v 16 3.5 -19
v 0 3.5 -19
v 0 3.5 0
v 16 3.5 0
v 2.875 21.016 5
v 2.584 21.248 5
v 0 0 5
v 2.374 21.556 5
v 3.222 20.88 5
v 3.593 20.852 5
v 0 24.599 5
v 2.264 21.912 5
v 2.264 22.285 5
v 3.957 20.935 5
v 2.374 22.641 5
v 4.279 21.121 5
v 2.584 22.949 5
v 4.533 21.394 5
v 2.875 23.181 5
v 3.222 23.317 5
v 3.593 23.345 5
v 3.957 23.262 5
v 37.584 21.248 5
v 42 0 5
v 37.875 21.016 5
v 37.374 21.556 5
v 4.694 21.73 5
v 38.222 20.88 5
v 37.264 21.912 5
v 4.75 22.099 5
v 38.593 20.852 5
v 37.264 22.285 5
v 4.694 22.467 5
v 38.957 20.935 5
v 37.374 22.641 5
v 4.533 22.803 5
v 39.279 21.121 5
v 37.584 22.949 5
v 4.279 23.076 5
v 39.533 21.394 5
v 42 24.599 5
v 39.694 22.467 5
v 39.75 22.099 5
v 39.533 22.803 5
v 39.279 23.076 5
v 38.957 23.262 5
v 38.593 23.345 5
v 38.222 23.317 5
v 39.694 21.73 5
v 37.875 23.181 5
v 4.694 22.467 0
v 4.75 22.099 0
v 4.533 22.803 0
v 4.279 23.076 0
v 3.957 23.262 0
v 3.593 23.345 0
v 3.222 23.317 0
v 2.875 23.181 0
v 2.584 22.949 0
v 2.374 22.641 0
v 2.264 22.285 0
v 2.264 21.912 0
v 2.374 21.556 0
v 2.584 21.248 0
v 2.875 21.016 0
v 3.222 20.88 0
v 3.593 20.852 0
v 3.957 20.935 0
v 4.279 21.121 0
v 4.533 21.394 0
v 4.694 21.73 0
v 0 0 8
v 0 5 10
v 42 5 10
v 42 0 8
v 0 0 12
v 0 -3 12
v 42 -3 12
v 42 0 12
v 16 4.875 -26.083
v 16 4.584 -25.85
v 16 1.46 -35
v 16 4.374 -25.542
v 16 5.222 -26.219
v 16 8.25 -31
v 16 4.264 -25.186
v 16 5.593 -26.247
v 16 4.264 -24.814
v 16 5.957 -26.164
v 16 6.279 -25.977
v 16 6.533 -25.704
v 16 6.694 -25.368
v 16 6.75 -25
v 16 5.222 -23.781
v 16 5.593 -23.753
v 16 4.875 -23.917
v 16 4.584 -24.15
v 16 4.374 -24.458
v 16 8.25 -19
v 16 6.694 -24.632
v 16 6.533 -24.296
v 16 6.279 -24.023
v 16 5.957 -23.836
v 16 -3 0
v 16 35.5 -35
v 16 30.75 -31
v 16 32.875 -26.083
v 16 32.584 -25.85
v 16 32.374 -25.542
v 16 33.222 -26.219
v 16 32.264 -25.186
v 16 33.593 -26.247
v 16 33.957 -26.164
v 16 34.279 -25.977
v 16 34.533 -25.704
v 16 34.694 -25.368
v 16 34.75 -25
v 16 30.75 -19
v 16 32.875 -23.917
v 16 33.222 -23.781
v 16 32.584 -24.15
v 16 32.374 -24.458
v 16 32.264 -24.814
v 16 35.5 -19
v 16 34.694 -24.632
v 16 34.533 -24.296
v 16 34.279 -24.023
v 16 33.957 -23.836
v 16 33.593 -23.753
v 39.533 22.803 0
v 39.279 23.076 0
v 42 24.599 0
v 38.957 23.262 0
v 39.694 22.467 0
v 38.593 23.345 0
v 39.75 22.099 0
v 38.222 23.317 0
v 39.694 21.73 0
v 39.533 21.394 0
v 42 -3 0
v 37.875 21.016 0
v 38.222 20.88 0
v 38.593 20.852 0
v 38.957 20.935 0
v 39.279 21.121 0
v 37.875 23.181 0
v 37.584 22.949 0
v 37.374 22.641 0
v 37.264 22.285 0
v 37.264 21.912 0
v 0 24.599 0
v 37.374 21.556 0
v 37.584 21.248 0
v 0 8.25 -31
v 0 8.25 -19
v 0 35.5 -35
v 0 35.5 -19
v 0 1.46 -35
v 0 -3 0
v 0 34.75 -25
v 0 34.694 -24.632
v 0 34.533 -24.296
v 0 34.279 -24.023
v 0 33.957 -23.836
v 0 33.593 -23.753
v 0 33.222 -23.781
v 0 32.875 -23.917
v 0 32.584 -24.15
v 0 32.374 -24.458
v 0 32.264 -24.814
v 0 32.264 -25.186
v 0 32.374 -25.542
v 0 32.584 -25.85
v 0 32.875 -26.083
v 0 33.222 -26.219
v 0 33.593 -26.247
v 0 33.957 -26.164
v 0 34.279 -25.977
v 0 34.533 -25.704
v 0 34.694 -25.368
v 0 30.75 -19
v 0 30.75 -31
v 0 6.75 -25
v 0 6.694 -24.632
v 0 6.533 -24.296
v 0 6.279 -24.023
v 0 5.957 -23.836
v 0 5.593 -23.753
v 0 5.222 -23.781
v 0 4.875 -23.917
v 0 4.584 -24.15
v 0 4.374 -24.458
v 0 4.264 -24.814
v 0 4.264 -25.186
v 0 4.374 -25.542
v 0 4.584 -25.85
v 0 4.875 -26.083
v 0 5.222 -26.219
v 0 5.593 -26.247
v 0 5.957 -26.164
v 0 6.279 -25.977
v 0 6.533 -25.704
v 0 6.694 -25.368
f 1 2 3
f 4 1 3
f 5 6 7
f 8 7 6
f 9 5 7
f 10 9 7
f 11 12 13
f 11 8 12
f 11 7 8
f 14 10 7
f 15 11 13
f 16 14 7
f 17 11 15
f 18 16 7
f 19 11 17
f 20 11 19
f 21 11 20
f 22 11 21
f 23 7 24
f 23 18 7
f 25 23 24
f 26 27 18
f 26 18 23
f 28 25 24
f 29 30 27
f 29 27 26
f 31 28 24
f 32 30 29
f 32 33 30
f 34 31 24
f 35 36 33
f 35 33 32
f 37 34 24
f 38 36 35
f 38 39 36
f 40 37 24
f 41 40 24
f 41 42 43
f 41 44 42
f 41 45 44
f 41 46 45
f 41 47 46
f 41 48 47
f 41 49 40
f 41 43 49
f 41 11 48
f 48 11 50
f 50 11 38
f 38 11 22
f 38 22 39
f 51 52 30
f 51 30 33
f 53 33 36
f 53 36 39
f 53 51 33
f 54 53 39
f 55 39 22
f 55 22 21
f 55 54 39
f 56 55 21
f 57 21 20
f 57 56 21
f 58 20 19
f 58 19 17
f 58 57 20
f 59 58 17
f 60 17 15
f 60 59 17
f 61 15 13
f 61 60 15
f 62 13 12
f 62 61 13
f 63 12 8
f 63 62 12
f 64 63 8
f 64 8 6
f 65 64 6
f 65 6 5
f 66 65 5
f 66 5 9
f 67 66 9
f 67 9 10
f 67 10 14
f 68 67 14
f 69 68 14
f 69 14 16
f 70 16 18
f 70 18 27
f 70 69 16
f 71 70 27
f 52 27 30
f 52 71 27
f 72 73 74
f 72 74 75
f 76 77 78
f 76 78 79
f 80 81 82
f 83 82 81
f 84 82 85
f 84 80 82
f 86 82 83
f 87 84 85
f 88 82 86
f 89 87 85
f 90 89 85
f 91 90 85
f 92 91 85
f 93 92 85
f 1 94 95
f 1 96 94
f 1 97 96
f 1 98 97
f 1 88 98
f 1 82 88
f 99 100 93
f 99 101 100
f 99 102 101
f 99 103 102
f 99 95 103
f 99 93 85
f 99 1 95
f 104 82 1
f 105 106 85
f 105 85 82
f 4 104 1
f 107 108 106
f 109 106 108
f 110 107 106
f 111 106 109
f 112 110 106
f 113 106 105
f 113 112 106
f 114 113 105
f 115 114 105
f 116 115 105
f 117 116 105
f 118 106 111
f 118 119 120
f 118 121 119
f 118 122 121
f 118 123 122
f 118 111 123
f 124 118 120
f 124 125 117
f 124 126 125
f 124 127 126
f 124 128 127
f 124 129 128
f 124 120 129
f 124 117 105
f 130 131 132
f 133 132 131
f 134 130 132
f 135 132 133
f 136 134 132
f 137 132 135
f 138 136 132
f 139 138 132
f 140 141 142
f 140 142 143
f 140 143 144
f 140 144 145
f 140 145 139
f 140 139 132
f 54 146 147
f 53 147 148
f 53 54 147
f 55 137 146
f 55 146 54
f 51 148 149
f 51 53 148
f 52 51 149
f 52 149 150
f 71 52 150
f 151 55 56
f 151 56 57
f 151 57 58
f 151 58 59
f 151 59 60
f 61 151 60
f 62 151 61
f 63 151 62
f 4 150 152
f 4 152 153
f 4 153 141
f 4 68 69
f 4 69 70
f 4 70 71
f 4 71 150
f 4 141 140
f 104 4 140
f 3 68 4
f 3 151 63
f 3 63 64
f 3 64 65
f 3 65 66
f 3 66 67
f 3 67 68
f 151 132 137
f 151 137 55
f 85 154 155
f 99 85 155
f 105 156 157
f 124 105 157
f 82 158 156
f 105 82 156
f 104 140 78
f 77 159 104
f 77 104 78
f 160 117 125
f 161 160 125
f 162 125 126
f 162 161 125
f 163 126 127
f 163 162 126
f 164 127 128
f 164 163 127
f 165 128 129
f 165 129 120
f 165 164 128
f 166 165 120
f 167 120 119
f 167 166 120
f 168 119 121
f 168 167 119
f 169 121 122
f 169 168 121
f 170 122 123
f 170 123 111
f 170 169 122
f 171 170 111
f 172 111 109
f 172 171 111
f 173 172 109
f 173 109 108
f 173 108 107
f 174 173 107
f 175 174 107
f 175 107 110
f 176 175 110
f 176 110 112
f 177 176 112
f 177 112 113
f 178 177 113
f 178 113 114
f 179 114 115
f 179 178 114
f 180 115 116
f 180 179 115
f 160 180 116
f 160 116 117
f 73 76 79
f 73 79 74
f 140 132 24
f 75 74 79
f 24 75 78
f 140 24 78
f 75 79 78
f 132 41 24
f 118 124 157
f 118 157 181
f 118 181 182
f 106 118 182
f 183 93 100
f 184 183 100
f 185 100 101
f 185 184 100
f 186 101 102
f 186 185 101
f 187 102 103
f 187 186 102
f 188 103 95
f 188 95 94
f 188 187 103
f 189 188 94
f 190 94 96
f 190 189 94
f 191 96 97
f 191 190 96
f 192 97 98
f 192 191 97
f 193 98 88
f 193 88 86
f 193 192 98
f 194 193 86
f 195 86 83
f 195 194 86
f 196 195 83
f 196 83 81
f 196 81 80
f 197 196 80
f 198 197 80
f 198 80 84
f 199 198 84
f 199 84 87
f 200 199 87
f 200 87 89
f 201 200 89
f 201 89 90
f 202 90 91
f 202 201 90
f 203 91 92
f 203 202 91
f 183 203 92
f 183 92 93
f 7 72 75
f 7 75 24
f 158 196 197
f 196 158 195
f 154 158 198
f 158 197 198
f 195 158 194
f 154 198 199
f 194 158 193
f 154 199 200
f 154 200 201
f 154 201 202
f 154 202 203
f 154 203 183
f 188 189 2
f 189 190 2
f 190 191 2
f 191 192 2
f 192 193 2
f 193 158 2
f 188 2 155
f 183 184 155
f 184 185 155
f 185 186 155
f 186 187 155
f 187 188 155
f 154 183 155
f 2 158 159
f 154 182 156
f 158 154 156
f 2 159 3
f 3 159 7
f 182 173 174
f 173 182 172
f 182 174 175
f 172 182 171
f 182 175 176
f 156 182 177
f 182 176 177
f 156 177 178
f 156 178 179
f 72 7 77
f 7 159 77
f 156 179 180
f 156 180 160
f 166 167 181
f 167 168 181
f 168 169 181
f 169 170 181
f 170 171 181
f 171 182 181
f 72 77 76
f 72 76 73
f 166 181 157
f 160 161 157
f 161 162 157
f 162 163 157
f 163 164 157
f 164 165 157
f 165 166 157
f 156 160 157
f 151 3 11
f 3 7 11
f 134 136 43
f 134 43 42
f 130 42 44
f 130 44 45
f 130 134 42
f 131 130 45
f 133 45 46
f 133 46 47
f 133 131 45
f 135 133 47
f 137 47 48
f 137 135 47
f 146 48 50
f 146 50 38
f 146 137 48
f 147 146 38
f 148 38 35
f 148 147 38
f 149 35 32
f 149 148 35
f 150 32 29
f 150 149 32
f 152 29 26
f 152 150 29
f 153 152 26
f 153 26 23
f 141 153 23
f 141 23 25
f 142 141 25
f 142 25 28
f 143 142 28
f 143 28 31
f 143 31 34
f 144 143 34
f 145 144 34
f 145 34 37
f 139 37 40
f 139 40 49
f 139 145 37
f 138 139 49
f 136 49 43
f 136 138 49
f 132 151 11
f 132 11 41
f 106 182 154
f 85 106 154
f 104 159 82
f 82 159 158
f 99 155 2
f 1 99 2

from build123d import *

# Parameters (mm, degrees)
F0_W     = 42
F0_H     = 24.59859317
F0_R     = 1.25
F1_DEPTH = 5
F3_DEPTH = 42
F5_R     = 1.25
F6_DEPTH = 16


with BuildPart() as f1:
    # F0 (on Top) → F1 (new body)
    with BuildSketch(Plane.XY):
        with Locations((21, 12.299296585)):
            Rectangle(F0_W, F0_H)
        with Locations((3.5, 22.09859317)):
            Circle(F0_R, mode=Mode.SUBTRACT)
        with Locations((38.5, 22.09859317)):
            Circle(F0_R, mode=Mode.SUBTRACT)
    extrude(amount=F1_DEPTH)

    # F2 (on face) → F3 (join, through all)
    with BuildSketch(Plane(origin=(0, 0, 0), x_dir=(0, -1, 0), z_dir=(-1, 0, 0))):
        Polygon((0, 5), (0, 0), (3, 0), (3, 12), (0, 12), (-5, 10), (0, 8), align=None)
    extrude(amount=-F3_DEPTH)

    # F5 (on Right) → F6 (join)
    with BuildSketch(Plane.YZ):
        Polygon((3.5, -19), (3.5, 0), (-3, 0), (1.4603033196, -35), (35.5, -35), (35.5, -19), (30.75, -19), (30.75, -31), (8.25, -31), (8.25, -19), align=None)
        with Locations((5.5, -25)):
            Circle(F5_R, mode=Mode.SUBTRACT)
        with Locations((33.5, -25)):
            Circle(F5_R, mode=Mode.SUBTRACT)
    extrude(amount=F6_DEPTH)


solid = f1.part
